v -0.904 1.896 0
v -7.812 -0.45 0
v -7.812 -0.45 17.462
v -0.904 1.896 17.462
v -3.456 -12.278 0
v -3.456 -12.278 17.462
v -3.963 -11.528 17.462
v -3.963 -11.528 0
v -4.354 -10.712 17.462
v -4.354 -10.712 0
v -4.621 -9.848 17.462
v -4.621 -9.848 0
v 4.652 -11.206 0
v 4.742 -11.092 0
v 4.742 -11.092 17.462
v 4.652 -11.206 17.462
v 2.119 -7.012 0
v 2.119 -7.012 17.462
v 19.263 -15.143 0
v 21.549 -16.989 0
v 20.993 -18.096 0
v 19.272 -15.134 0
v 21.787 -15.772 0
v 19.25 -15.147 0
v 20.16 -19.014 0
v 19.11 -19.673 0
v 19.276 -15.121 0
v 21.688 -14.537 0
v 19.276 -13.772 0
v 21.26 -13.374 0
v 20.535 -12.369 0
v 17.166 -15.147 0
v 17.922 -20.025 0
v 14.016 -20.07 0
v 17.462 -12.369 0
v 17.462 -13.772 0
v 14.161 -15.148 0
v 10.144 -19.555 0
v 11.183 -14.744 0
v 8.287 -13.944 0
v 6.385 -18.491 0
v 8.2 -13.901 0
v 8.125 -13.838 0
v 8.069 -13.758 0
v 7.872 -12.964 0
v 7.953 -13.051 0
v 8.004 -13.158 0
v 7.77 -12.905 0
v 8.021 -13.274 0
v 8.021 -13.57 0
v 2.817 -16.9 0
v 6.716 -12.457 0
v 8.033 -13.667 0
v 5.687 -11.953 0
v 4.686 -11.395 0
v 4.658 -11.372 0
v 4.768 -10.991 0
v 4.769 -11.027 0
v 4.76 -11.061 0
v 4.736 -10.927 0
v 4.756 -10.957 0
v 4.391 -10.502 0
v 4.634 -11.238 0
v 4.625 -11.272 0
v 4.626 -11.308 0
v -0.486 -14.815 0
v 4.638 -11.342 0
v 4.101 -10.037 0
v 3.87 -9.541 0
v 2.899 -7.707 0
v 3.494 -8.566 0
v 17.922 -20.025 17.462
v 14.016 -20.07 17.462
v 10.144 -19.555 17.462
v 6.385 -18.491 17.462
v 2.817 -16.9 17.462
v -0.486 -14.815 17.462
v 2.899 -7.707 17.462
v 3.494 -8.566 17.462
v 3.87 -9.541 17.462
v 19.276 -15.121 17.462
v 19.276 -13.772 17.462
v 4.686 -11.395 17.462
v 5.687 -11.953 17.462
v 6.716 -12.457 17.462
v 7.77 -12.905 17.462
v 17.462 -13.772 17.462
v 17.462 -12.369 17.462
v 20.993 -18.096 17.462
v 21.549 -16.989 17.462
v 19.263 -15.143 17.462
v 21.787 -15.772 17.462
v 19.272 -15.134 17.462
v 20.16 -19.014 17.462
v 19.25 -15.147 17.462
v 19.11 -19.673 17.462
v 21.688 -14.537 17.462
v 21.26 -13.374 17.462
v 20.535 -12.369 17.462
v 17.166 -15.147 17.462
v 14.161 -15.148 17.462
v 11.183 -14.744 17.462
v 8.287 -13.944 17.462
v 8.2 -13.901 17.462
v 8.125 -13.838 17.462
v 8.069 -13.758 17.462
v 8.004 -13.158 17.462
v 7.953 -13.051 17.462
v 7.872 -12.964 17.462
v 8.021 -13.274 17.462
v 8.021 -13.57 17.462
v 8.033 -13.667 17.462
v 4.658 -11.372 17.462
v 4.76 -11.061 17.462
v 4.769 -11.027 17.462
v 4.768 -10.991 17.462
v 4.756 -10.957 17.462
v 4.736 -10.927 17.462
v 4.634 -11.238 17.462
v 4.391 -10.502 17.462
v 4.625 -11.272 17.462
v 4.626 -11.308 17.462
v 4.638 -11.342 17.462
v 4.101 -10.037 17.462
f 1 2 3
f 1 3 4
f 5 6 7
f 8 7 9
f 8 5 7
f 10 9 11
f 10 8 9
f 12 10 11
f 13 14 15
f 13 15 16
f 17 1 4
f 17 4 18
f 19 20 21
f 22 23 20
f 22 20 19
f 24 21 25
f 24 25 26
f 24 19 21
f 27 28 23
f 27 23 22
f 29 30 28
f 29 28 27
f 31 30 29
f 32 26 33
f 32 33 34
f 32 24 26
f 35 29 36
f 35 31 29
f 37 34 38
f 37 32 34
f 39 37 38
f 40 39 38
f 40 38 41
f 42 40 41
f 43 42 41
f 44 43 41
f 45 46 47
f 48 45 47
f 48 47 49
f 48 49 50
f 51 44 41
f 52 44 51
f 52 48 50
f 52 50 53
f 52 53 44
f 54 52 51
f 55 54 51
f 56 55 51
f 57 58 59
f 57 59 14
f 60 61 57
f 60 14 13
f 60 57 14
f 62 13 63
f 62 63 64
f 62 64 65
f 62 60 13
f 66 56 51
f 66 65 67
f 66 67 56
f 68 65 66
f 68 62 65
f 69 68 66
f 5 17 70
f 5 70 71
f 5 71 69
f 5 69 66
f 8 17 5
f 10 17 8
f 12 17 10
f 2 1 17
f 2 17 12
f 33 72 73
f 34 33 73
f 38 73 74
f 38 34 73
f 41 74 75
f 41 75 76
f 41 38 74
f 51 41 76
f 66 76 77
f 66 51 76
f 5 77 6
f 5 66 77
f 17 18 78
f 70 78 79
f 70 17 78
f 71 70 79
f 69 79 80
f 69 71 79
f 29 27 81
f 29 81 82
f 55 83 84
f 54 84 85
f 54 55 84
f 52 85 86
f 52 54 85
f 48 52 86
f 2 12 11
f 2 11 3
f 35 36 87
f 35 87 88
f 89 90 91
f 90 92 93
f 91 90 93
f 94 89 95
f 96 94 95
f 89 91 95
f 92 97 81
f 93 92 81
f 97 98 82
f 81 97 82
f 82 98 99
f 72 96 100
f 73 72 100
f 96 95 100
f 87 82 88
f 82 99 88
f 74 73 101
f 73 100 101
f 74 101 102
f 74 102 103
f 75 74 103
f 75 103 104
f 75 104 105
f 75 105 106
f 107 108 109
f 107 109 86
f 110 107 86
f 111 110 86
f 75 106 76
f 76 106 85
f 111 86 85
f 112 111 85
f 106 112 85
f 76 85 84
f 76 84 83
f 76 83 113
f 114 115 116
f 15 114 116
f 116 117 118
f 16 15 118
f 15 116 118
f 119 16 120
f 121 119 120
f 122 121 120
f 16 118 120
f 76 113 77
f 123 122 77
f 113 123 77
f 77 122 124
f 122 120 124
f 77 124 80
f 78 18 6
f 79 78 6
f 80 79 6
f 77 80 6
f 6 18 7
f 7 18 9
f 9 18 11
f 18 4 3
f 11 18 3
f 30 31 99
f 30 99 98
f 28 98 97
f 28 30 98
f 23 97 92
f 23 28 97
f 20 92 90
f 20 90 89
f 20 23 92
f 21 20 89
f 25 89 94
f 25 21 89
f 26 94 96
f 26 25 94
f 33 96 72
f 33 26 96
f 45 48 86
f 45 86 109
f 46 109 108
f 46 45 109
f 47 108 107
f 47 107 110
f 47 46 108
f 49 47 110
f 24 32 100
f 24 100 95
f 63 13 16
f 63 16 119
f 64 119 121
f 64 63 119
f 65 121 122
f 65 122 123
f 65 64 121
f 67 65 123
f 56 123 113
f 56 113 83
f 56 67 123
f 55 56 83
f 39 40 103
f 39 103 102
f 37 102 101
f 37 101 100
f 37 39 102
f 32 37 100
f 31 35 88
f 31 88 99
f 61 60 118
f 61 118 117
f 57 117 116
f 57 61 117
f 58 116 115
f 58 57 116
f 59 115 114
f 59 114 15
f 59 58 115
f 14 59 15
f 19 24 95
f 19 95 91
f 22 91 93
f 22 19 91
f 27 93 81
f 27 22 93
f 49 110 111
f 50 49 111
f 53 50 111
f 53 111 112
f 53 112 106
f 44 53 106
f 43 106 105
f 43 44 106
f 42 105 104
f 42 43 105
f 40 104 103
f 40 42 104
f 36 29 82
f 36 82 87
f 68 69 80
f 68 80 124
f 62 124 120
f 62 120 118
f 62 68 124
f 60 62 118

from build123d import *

# Parameters (mm, degrees)
BOSS_EXTRUDE1_DEPTH = 17.4625


with BuildPart() as part:
    # Sketch1 → Boss-Extrude1 (new body)
    with BuildSketch(Plane.XY):
        with BuildLine():
            Line((17.165632348, -15.146713758), (19.25021974, -15.146713758))
            ThreePointArc((19.25021974, -15.146713758), (19.268180252, -15.139274271), (19.27561974, -15.121313758))
            Line((19.27561974, -15.121313758), (19.27561974, -13.771938758))
            Line((19.27561974, -13.771938758), (17.462436286, -13.771938758))
            Line((17.462436286, -13.771938758), (17.462436286, -12.368588758))
            Line((17.462436286, -12.368588758), (20.535179361, -12.368588758))
            ThreePointArc((20.535179361, -12.368588758), (21.54921714, -16.988767417), (17.921869262, -20.024664455))
            ThreePointArc((17.921869262, -20.024664455), (6.385080471, -18.490906221), (-3.456137762, -12.277989546))
            ThreePointArc((-3.456137762, -12.277989546), (-4.173487151, -11.127601987), (-4.620530274, -9.847705847))
            Line((-4.620530274, -9.847705847), (-7.811999534, -0.450394448))
            Line((-7.811999534, -0.450394448), (-0.904044887, 1.896214799))
            Line((-0.904044887, 1.896214799), (2.118621316, -7.011726883))
            ThreePointArc((2.118621316, -7.011726883), (3.222227995, -8.118323003), (3.87016333, -9.540533423))
            ThreePointArc((3.87016333, -9.540533423), (4.239027768, -10.27403939), (4.736122073, -10.927483519))
            ThreePointArc((4.736122073, -10.927483519), (4.769468956, -11.008731963), (4.742121249, -11.092191097))
            Line((4.742121249, -11.092191097), (4.651650579, -11.206452905))
            ThreePointArc((4.651650579, -11.206452905), (4.626334833, -11.308376501), (4.686416978, -11.394512685))
            ThreePointArc((4.686416978, -11.394512685), (6.198075477, -12.211534349), (7.770150037, -12.905232694))
            ThreePointArc((7.770150037, -12.905232694), (7.952657914, -13.051135413), (8.021441195, -13.274441457))
            Line((8.021441195, -13.274441457), (8.021441195, -13.569821942))
            ThreePointArc((8.021441195, -13.569821942), (8.094604206, -13.799430989), (8.287118368, -13.944384215))
            ThreePointArc((8.287118368, -13.944384215), (12.665355124, -14.99614841), (17.165632348, -15.146713758))
        make_face()
    extrude(amount=BOSS_EXTRUDE1_DEPTH)


solid = part.part
